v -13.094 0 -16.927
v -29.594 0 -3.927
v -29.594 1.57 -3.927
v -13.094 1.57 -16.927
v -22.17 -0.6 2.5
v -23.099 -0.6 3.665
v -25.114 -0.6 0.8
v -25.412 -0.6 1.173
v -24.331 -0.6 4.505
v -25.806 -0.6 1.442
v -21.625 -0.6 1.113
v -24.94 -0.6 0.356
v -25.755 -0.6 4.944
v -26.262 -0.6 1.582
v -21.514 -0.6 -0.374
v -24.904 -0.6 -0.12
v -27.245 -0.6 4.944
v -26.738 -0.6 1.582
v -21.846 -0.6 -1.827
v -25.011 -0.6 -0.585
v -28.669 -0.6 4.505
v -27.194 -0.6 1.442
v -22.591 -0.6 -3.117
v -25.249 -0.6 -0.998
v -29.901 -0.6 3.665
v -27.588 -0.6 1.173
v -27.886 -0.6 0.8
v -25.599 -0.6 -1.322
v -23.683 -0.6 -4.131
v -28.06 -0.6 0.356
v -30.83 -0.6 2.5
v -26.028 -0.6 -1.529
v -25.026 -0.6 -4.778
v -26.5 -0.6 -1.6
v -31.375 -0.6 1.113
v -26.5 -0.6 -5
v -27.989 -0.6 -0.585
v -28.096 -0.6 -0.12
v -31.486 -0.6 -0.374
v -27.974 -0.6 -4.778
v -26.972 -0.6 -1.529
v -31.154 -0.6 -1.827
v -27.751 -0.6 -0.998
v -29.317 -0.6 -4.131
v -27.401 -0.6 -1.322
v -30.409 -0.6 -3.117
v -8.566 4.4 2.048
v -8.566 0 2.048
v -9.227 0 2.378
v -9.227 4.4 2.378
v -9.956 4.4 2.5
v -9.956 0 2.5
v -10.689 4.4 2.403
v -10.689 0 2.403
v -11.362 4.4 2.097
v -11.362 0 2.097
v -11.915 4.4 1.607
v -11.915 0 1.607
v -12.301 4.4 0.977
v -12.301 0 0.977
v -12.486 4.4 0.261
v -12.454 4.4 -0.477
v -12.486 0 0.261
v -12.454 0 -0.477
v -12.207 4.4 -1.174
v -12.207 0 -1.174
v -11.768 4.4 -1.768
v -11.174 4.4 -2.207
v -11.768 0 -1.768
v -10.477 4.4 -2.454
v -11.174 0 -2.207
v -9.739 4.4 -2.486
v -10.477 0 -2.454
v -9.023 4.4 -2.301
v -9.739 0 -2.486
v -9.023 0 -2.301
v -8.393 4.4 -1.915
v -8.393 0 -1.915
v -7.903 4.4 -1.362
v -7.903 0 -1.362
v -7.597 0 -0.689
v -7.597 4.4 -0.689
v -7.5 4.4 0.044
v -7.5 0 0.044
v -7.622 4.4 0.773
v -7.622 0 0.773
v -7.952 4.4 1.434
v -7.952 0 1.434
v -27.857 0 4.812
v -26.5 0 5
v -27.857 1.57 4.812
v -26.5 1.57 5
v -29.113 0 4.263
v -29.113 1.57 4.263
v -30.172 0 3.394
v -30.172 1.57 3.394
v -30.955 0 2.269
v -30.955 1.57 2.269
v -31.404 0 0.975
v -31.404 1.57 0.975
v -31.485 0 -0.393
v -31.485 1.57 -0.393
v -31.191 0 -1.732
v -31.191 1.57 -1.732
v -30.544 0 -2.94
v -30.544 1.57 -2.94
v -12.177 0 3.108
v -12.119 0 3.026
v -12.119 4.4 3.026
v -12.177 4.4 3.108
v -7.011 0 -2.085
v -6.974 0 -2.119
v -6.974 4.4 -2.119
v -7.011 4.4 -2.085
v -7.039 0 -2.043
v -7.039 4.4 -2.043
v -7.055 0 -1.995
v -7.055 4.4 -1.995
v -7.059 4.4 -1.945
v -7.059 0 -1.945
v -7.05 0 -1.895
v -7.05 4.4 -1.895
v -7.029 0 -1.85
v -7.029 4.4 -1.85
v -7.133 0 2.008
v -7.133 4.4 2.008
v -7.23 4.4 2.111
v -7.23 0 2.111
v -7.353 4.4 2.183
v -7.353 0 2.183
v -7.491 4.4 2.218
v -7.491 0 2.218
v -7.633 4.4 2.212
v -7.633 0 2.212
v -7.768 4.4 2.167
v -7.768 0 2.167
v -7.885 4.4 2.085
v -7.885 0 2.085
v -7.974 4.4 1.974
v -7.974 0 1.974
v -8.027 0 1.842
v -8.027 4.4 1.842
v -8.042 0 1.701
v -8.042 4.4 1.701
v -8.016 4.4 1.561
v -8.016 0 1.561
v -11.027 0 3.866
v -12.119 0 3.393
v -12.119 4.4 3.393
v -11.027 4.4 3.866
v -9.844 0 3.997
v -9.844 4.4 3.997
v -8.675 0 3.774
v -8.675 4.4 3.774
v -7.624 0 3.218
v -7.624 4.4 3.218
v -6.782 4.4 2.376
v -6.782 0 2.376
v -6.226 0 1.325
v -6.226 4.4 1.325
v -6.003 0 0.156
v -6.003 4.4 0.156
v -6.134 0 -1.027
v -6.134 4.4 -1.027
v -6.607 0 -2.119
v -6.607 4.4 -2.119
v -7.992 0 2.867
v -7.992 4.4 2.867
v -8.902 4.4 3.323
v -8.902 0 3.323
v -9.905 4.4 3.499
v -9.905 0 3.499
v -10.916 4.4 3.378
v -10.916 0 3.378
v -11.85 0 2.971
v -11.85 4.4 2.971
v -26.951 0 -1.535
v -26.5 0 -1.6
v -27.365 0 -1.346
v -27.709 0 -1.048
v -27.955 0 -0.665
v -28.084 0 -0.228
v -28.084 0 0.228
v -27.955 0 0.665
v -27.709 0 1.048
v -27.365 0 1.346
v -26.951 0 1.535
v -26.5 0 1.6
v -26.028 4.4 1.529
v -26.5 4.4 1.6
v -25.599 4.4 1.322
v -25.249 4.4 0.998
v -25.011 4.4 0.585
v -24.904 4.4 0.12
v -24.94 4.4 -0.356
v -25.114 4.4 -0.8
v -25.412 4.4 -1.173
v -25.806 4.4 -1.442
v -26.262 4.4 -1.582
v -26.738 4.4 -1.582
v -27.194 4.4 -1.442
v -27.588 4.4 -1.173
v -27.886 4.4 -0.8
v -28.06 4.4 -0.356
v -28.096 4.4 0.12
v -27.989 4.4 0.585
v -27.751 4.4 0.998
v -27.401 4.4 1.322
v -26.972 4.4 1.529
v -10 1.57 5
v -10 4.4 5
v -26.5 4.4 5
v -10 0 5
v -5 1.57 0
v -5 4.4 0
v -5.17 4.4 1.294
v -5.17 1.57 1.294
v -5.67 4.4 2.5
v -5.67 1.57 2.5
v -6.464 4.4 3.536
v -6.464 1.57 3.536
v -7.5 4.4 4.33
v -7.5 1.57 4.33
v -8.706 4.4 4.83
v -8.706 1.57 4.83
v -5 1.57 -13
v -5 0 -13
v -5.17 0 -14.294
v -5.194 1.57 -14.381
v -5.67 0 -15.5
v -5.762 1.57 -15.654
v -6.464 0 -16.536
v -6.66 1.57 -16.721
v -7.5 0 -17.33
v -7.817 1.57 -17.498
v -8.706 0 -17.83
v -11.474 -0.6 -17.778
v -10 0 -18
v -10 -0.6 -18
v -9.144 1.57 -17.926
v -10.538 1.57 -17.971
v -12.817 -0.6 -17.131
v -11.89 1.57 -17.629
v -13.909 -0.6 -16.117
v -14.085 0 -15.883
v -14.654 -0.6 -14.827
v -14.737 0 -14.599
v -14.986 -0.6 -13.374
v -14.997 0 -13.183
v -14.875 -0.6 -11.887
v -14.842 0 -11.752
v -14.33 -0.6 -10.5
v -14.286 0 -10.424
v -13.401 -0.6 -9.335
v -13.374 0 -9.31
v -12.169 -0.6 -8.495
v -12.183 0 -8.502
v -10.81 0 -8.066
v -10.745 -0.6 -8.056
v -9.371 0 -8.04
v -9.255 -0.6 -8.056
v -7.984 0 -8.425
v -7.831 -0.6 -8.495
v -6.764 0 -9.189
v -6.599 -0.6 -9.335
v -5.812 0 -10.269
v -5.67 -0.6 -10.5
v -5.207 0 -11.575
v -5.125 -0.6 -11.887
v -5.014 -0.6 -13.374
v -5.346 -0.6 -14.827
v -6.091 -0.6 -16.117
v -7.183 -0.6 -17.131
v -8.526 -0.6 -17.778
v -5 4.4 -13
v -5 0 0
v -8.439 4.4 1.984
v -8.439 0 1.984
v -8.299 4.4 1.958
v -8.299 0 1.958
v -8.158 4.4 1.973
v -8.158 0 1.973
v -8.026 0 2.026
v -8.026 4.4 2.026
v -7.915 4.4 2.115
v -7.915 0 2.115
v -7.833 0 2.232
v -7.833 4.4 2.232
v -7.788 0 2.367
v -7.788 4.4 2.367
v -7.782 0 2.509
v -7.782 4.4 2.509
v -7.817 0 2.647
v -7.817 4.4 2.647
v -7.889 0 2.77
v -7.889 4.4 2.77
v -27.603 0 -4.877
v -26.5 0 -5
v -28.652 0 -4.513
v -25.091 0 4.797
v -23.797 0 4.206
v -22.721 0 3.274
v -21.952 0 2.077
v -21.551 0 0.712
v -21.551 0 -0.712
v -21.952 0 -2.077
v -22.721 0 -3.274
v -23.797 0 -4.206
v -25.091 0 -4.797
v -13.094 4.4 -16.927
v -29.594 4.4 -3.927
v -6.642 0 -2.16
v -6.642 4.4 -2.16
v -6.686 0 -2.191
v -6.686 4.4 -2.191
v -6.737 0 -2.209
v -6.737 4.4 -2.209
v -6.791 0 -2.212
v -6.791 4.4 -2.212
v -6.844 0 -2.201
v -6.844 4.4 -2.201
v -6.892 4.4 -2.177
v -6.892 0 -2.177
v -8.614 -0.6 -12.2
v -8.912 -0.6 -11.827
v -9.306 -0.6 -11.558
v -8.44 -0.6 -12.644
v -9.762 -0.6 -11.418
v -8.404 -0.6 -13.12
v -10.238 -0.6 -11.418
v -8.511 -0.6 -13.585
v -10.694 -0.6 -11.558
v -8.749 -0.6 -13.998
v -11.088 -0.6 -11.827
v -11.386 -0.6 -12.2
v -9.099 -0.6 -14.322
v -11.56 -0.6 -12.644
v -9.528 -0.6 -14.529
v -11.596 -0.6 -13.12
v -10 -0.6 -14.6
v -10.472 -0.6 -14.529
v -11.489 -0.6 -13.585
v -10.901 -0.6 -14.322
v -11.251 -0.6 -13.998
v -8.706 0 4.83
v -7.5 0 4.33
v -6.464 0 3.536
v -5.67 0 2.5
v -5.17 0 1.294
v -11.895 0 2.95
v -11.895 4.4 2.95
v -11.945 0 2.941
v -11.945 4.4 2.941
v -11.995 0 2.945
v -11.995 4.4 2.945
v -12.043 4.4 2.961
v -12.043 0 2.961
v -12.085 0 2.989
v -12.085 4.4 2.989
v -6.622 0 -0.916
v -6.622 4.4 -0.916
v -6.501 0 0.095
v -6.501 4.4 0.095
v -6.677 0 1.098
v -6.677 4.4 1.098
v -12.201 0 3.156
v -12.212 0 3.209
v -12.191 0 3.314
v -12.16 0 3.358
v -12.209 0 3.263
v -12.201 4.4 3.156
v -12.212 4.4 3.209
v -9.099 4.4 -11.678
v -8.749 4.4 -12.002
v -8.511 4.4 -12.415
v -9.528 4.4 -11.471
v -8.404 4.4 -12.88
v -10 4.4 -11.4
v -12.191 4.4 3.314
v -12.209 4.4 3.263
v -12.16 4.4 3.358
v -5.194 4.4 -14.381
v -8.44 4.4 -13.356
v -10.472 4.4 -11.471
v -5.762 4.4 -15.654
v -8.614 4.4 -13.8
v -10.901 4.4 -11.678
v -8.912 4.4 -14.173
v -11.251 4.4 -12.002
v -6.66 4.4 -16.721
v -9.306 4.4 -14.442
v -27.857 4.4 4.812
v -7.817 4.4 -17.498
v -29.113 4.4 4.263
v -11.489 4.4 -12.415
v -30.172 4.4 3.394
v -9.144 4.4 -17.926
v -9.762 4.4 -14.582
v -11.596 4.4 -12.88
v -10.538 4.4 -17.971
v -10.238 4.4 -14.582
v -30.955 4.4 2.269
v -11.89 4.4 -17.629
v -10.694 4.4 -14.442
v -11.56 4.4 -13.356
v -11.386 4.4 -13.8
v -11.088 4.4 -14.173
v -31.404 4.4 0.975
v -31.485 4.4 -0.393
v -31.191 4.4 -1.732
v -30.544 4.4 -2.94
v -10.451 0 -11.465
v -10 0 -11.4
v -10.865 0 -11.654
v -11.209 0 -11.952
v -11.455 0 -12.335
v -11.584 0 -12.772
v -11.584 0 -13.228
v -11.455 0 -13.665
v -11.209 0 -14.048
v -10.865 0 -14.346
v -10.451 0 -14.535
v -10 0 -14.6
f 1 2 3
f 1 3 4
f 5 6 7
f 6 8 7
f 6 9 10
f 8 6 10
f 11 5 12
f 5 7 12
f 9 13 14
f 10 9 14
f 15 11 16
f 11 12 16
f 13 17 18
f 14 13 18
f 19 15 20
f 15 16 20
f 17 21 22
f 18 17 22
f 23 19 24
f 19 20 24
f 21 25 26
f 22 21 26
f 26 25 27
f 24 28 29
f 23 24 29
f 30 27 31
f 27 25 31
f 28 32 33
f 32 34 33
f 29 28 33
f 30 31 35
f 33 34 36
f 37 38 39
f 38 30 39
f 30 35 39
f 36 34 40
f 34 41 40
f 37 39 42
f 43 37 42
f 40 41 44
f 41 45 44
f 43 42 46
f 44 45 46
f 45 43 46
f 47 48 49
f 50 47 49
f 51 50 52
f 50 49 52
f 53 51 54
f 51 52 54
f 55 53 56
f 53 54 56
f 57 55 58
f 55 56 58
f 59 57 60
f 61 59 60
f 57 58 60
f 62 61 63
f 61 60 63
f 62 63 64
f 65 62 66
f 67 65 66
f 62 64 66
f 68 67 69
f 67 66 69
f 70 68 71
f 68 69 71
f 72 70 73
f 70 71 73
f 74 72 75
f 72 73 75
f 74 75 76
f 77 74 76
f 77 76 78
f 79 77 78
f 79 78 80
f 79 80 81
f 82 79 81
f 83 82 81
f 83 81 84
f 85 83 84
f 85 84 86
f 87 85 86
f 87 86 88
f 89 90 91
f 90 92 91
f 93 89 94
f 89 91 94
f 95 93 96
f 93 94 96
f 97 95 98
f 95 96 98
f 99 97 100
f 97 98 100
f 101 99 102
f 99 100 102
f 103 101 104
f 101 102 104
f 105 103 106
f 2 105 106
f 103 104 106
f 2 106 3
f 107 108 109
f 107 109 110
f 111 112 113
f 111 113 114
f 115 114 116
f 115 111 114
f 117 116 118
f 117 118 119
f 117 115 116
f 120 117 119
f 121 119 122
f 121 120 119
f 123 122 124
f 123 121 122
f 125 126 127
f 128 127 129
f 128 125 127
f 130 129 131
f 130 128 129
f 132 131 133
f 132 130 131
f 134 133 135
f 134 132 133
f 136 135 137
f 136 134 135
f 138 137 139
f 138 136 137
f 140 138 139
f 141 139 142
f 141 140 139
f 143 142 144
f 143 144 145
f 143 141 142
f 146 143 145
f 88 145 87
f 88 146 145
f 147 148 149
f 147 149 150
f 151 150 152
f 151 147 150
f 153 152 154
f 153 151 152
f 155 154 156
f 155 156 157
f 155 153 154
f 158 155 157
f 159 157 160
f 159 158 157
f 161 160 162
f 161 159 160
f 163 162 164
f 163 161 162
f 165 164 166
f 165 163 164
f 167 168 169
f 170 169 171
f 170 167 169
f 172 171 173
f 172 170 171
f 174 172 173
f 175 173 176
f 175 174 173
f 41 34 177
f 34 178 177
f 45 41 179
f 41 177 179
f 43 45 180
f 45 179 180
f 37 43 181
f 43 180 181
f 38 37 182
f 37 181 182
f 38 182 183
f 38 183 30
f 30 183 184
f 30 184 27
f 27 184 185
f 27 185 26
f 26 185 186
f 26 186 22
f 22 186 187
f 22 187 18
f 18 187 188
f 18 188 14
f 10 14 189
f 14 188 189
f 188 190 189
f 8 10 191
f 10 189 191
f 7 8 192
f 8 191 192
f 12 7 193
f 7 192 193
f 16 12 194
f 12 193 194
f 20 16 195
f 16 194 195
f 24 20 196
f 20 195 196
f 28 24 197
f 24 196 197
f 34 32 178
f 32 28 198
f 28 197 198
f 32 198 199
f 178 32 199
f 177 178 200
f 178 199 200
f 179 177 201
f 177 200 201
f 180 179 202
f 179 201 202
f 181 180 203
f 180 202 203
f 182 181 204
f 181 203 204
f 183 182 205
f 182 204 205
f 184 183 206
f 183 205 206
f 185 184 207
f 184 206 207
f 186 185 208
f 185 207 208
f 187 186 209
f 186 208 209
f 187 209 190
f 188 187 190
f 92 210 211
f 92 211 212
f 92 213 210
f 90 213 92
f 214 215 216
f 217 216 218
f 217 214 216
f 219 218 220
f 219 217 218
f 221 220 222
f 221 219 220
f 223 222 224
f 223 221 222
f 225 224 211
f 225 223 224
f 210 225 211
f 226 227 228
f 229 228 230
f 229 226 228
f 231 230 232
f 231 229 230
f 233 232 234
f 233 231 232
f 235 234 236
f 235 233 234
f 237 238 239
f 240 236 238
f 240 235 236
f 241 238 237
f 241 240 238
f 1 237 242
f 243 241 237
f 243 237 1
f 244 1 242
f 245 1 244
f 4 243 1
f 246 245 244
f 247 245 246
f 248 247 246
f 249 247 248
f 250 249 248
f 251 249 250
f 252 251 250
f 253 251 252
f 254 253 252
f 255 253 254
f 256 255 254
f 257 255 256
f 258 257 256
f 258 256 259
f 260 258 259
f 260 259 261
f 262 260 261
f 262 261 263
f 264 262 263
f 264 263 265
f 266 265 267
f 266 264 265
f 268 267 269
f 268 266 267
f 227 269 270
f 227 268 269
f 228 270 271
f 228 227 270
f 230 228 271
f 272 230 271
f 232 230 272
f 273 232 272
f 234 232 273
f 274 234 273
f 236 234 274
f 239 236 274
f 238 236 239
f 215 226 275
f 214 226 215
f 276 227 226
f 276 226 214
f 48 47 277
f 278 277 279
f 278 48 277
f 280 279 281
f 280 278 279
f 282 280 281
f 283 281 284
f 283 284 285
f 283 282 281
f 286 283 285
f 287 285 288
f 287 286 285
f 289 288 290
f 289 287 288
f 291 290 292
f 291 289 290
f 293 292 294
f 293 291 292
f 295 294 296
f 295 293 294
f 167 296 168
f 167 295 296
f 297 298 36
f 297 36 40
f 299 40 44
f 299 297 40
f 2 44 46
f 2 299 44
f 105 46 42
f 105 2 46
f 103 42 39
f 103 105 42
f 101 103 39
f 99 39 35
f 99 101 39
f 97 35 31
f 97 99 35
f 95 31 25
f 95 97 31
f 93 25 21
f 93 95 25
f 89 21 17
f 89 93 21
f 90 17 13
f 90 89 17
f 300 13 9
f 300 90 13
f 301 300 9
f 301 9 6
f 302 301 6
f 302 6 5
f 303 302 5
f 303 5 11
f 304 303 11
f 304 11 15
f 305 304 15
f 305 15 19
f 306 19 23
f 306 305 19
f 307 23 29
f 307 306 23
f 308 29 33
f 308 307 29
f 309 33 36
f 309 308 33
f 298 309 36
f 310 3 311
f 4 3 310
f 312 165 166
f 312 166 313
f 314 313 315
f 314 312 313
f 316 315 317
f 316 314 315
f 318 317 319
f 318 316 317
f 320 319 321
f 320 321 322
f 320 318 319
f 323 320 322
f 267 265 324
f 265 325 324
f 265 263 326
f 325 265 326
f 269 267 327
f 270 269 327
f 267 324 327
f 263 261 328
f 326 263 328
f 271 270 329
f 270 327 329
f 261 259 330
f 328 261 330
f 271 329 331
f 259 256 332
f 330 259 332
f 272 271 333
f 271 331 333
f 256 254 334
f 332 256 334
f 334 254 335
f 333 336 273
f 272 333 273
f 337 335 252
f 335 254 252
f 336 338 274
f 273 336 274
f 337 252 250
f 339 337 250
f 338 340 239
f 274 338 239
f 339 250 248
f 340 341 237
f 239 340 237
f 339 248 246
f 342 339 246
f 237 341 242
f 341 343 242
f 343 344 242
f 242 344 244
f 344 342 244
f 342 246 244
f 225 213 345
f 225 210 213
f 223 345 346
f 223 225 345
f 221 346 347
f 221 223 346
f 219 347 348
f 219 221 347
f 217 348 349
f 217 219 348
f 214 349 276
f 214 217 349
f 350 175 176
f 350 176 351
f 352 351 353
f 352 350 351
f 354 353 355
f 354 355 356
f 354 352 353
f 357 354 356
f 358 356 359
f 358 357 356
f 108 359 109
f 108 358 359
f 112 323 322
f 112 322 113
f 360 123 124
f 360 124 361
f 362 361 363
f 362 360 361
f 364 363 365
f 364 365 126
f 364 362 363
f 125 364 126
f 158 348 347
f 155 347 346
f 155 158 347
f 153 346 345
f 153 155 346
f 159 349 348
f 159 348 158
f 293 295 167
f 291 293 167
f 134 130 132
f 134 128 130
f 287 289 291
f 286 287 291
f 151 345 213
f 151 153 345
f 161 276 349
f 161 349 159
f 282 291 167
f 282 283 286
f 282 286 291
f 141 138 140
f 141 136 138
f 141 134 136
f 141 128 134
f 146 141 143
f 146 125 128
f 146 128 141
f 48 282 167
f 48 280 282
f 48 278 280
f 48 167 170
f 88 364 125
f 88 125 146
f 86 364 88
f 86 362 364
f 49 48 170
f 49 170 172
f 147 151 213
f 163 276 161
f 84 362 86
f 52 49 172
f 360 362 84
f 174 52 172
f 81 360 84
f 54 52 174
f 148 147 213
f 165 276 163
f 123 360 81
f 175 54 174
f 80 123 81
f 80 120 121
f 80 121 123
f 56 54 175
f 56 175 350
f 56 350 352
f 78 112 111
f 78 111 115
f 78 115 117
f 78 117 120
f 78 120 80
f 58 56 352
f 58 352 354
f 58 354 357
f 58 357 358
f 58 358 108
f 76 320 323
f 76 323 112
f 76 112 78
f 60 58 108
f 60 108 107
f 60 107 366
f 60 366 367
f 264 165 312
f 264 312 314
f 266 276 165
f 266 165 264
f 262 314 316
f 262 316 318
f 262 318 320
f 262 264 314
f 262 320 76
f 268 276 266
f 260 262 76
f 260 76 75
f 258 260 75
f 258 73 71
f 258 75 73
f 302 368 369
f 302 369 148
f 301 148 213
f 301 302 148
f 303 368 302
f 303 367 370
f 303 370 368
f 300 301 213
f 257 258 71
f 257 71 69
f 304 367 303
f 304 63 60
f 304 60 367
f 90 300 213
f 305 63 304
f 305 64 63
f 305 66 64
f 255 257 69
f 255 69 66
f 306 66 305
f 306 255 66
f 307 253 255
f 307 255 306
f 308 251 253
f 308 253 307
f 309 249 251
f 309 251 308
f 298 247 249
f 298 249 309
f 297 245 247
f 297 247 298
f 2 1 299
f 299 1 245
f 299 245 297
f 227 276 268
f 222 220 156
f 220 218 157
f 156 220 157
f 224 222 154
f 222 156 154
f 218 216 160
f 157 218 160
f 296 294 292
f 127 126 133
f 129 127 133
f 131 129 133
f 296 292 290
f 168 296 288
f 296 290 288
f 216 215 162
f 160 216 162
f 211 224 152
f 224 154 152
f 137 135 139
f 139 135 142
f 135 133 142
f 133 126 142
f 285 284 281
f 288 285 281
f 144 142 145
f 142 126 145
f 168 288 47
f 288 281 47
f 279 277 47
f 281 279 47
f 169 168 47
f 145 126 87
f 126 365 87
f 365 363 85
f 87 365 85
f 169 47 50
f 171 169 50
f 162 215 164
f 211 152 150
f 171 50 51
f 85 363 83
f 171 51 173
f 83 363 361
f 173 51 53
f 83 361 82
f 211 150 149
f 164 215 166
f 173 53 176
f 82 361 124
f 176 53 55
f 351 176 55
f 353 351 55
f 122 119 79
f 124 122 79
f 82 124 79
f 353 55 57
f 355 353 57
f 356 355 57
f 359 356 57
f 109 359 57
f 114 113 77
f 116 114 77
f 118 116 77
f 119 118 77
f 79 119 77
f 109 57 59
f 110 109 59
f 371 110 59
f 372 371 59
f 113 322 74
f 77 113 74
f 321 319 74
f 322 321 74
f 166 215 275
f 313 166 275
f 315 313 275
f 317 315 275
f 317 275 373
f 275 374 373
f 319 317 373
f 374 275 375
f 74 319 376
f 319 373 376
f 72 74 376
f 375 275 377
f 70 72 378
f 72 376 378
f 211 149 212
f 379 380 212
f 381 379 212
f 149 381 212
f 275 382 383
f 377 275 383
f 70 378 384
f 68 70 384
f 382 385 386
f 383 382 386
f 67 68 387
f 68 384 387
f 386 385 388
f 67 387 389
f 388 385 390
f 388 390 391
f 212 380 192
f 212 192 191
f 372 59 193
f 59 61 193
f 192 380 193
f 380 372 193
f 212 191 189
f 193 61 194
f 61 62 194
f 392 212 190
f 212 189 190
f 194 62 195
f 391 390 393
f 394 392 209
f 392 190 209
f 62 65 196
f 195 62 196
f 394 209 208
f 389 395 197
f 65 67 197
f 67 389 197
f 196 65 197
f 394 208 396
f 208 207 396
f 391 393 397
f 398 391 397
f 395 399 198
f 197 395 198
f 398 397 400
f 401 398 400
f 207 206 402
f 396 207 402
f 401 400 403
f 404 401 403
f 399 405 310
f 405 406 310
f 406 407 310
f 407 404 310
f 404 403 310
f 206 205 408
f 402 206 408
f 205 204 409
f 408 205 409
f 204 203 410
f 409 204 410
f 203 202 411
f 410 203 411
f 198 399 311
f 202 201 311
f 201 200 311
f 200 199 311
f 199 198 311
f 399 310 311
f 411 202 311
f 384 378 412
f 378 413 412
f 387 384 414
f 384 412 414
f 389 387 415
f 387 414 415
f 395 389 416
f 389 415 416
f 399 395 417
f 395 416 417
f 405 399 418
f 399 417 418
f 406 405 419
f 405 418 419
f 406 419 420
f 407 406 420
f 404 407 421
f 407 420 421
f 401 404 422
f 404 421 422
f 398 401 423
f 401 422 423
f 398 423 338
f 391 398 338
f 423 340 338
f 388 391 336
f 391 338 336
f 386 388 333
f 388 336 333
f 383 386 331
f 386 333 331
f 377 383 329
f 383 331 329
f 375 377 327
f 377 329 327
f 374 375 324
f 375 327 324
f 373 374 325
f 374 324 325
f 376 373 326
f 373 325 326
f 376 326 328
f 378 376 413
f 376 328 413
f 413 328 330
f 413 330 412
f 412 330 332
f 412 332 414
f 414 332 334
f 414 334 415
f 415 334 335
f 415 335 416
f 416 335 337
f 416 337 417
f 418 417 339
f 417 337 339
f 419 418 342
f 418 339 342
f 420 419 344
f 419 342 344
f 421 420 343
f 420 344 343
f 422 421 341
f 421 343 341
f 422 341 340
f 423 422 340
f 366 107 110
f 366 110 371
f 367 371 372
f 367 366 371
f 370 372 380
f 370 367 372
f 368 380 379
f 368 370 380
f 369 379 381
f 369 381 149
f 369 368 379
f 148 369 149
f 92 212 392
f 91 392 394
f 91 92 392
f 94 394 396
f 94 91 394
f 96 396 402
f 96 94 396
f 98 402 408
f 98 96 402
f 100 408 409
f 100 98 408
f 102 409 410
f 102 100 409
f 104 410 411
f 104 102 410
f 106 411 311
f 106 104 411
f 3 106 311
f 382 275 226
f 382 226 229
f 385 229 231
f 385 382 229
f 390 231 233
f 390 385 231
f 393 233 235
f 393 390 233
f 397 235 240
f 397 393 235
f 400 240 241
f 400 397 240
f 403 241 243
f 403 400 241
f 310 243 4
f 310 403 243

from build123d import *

# Parameters (mm, degrees)
SKETCH1_R           = 1.6
SKETCH1_R_2         = 2.5
BOSS_EXTRUDE1_DEPTH = 1.57
FILLET1_R           = 5
SKETCH2_R           = 2.5
SKETCH2_R_2         = 1.6
BOSS_EXTRUDE2_DEPTH = 2.83
SKETCH3_R           = 5
SKETCH3_R_2         = 1.6
BOSS_EXTRUDE3_DEPTH = 0.6
CUT_EXTRUDE1_START  = -10
CUT_EXTRUDE1_DEPTH  = 10


with BuildPart() as part:
    # Sketch1 → Boss-Extrude1 (new body)
    with BuildSketch(Plane(origin=(0, 0, 0), x_dir=(1, 0, 0), z_dir=(0, 1, 0))):
        Polygon((-5, -5), (30.925365976, -5), (-5, 23.304833799), align=None)
        with Locations(Location((16.5, 0, 0), (0, 0, 270))):
            Circle(SKETCH1_R, mode=Mode.SUBTRACT)
        with Locations(Location((0, 0, 0), (0, 0, 270))):
            Circle(SKETCH1_R_2, mode=Mode.SUBTRACT)
        with Locations(Location((0, 13, 0), (0, 0, 270))):
            Circle(SKETCH1_R, mode=Mode.SUBTRACT)
    extrude(amount=BOSS_EXTRUDE1_DEPTH)

    # Fillet1
    fillet1_edges = [part.edges().sort_by_distance(p)[0] for p in [
        (-5, 0.785, -23.304833799),
        (30.925365976, 0.785, 5),
        (-5, 0.785, 5),
    ]]
    fillet(fillet1_edges, radius=FILLET1_R)

    # Sketch2 → Boss-Extrude2 (add)
    with BuildSketch(Plane(origin=(0, 1.57, 0), x_dir=(1, 0, 0), z_dir=(0, 1, 0))):
        with BuildLine():
            Line((19.594361133, 3.927458361), (3.094361133, 16.927458361))
            ThreePointArc((3.094361133, 16.927458361), (-2.182681188, 17.498433375), (-5, 13))
            Line((-5, 13), (-5, 0))
            ThreePointArc((-5, 0), (-3.535533906, -3.535533906), (0, -5))
            Line((0, -5), (16.5, -5))
            ThreePointArc((16.5, -5), (21.224261413, -1.637484075), (19.594361133, 3.927458361))
        make_face()
        with Locations(Location((0, 0, 0), (0, 0, 270))):
            Circle(SKETCH2_R, mode=Mode.SUBTRACT)
        with Locations(Location((16.5, 0, 0), (0, 0, 270))):
            Circle(SKETCH2_R_2, mode=Mode.SUBTRACT)
        with Locations(Location((0, 13, 0), (0, 0, 270))):
            Circle(SKETCH2_R_2, mode=Mode.SUBTRACT)
    extrude(amount=BOSS_EXTRUDE2_DEPTH)

    # Sketch3 → Boss-Extrude3 (add)
    # profile 1 of 2: a face of its own
    with BuildSketch(Plane.XZ):
        with Locations(Location((16.5, 0, 0), (0, 0, 270))):
            Circle(SKETCH3_R)
        with Locations(Location((16.5, 0, 0), (0, 0, 270))):
            Circle(SKETCH3_R_2, mode=Mode.SUBTRACT)
    # profile 2 of 2: a face of its own
    with BuildSketch(Plane.XZ):
        with Locations(Location((0, -13, 0), (0, 0, 270))):
            Circle(SKETCH3_R)
        with Locations(Location((0, -13, 0), (0, 0, 270))):
            Circle(SKETCH3_R_2, mode=Mode.SUBTRACT)
    extrude(amount=BOSS_EXTRUDE3_DEPTH)

    # Sketch4 → Cut-Extrude1 (cut)
    with BuildSketch(Plane(origin=(0, 4.4, 0), x_dir=(1, 0, 0), z_dir=(0, 1, 0)).offset(CUT_EXTRUDE1_START)):
        with BuildLine():
            Line((2.119130133, -3.026431476), (2.176569541, -3.108463452))
            ThreePointArc((2.176569541, -3.108463452), (2.208718169, -3.263081334), (2.118672771, -3.392819725))
            ThreePointArc((2.118672771, -3.392819725), (-2.828427125, -2.828427125), (-3.392819725, 2.118672771))
            ThreePointArc((-3.392819725, 2.118672771), (-3.263081334, 2.208718169), (-3.108463452, 2.176569541))
            Line((-3.108463452, 2.176569541), (-3.026431476, 2.119130133))
            ThreePointArc((-3.026431476, 2.119130133), (-2.945196197, 1.995341896), (-2.971355046, 1.849607847))
            ThreePointArc((-2.971355046, 1.849607847), (-3.498720526, -0.094629188), (-2.867032155, -2.007517527))
            ThreePointArc((-2.867032155, -2.007517527), (-2.170667915, -2.130305331), (-2.047880111, -1.433941091))
            ThreePointArc((-2.047880111, -1.433941091), (-1.767766953, -1.767766953), (-1.433941091, -2.047880111))
            ThreePointArc((-1.433941091, -2.047880111), (-2.130305331, -2.170667915), (-2.007517527, -2.867032155))
            ThreePointArc((-2.007517527, -2.867032155), (-0.094629188, -3.498720526), (1.849607847, -2.971355046))
            ThreePointArc((1.849607847, -2.971355046), (1.995341896, -2.945196197), (2.119130133, -3.026431476))
        make_face()
    extrude(amount=CUT_EXTRUDE1_DEPTH, mode=Mode.SUBTRACT)


with BuildPart() as body_2:
    # Mirror1: mirrored copy
    add(part.part.mirror(Plane(origin=(-5, 1.57, -23.304833799), x_dir=(0, 0, 1), z_dir=(1, 0, 0))))


solid = body_2.part
